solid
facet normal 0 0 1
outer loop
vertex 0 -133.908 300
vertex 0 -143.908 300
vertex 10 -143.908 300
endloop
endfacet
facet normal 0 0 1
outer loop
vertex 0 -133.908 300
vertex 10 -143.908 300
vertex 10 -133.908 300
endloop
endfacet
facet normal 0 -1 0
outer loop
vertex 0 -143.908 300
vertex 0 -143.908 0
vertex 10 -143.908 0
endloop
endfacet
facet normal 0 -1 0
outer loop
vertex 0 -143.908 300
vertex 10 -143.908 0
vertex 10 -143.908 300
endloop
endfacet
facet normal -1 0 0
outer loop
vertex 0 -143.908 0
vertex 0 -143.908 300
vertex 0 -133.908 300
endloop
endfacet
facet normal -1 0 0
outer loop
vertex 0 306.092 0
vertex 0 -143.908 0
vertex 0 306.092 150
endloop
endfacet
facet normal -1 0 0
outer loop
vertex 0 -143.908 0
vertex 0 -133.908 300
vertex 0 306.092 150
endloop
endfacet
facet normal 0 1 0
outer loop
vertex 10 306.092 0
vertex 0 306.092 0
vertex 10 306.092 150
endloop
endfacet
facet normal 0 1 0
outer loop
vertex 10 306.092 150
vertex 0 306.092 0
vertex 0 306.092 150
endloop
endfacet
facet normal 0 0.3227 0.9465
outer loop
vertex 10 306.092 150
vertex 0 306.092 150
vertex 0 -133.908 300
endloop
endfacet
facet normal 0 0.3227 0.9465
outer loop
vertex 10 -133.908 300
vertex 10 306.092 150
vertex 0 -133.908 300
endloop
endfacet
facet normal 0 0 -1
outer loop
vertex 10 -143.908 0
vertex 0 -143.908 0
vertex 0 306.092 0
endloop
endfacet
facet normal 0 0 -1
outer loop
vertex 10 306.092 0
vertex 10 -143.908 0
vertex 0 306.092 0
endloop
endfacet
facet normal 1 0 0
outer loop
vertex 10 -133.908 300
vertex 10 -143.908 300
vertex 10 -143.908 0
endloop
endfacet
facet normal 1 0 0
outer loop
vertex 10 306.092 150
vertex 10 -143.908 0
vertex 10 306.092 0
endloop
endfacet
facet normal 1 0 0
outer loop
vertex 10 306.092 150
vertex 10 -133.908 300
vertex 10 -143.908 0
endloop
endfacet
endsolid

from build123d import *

# Parameters (mm, degrees)
F0_W     = 10
F0_H     = 300
F0_W_2   = 188.557307
F0_H_2   = 150
F1_DEPTH = 10


with BuildPart() as f1:
    # F0 (on Right) → F1 (new body)
    with BuildSketch(Plane.YZ):
        with Locations((-138.908036, 150)):
            Rectangle(F0_W, F0_H)
        Polygon((-133.908036, 300), (-133.908036, 0), (117.534657, 0), (117.534657, 150), (306.091964, 150), align=None)
        with Locations((211.81331, 75)):
            Rectangle(F0_W_2, F0_H_2)
    extrude(amount=F1_DEPTH)


solid = f1.part
